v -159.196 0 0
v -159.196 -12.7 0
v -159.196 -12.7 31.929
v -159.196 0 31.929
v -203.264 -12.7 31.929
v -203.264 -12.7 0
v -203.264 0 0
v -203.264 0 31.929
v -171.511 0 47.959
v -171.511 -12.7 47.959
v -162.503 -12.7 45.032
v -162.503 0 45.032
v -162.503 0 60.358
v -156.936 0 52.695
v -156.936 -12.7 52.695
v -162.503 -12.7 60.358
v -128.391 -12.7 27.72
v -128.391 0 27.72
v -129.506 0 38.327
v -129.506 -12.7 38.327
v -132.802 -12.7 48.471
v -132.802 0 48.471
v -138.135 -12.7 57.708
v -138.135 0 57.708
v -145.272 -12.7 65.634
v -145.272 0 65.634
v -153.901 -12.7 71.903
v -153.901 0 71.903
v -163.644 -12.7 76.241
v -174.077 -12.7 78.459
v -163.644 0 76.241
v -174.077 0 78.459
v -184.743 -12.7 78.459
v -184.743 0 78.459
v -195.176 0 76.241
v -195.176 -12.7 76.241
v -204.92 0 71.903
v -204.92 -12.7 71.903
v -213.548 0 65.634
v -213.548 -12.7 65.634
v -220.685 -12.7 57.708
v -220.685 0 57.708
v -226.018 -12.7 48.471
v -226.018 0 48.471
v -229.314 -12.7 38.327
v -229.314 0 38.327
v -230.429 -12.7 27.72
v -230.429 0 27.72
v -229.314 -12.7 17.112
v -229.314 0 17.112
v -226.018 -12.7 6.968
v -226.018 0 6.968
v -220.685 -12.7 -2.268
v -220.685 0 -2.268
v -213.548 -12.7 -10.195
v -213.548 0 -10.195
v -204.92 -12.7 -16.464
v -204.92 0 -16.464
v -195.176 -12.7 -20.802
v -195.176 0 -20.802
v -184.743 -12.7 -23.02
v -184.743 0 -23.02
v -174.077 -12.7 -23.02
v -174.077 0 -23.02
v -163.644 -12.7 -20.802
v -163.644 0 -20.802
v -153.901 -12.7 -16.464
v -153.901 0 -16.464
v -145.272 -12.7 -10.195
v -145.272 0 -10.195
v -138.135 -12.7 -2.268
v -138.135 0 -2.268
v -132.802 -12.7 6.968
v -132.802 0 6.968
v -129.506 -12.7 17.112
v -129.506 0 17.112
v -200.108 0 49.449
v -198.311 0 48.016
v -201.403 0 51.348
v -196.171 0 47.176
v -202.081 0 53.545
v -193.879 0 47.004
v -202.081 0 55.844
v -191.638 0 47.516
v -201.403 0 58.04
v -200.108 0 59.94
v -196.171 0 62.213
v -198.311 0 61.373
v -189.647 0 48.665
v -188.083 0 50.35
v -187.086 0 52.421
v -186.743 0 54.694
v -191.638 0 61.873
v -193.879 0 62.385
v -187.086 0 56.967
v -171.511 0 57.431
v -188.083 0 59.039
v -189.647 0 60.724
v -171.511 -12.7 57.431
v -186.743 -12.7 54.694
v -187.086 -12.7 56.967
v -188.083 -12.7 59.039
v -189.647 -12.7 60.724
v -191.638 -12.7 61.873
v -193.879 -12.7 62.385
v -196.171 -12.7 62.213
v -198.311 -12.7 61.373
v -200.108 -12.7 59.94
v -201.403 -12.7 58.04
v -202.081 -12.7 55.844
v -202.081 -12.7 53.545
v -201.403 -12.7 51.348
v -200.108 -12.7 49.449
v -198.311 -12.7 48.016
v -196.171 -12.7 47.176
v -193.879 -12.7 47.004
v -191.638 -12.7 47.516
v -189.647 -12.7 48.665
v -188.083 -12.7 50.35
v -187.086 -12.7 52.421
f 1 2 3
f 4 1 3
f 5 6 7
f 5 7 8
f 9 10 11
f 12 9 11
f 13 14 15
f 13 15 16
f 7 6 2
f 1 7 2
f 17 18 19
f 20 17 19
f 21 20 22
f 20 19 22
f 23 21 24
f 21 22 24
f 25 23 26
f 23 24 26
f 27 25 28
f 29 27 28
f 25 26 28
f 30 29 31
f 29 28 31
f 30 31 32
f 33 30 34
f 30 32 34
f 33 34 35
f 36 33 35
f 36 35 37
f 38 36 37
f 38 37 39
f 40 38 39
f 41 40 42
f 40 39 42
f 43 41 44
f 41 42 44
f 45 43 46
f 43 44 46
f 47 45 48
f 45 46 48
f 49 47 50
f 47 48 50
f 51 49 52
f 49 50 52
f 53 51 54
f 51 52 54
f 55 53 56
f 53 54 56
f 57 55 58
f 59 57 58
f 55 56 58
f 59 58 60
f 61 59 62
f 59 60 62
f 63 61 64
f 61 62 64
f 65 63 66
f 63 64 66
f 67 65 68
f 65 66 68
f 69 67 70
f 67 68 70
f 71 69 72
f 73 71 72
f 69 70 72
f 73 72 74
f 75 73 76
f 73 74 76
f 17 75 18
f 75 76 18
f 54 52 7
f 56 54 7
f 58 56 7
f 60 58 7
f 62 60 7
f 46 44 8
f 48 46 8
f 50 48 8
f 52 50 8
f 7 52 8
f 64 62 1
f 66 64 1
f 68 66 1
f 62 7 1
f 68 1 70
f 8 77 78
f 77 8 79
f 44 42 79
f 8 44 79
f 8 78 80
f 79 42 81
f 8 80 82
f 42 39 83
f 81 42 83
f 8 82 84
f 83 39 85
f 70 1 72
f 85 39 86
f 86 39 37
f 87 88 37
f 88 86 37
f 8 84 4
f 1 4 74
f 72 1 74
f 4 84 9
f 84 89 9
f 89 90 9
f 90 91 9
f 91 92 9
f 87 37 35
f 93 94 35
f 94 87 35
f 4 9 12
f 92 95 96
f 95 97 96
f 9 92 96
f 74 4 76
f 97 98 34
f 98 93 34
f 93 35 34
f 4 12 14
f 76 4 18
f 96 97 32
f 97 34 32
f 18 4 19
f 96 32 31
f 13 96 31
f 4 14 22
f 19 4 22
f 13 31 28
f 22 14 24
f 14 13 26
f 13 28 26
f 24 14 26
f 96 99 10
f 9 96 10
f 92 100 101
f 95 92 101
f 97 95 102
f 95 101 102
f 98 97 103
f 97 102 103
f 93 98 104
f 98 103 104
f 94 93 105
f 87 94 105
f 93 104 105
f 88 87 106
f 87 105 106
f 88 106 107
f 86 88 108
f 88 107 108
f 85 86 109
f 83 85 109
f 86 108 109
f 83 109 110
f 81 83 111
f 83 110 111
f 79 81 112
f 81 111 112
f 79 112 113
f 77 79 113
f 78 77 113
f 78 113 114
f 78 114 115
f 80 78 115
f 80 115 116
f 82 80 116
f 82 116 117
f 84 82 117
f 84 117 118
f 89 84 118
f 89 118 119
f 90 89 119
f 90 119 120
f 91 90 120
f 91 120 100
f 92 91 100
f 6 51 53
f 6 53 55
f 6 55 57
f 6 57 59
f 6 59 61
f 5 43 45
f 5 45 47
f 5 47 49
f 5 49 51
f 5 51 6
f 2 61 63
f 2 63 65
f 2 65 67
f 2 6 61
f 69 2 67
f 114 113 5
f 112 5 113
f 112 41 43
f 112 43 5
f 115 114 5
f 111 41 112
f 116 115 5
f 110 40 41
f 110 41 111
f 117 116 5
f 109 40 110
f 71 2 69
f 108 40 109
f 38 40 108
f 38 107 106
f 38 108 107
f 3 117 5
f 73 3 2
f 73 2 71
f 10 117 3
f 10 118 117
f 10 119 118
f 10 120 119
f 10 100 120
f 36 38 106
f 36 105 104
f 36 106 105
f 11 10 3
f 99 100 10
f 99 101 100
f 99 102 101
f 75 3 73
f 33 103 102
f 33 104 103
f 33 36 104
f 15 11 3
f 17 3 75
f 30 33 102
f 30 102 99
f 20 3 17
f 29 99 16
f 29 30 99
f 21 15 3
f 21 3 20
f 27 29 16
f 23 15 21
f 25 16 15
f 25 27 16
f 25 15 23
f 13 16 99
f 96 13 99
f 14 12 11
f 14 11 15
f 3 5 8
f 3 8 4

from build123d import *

# Parameters (mm, degrees)
F0_R     = 51.018803
F1_DEPTH = 12.7
F2_W     = 44.067815
F2_H     = 31.929322
F3_DEPTH = 25.4
F5_DEPTH = 25.4
F6_R     = 7.711808
F7_DEPTH = 25.4


with BuildPart() as f1:
    # F0 (on Front) → F1 (new body)
    with BuildSketch(Plane.XZ):
        with Locations((-179.4101, 27.719645)):
            Circle(F0_R)
    extrude(amount=F1_DEPTH)

    # F2 (on face) → F3 (cut)
    with BuildSketch(Plane.XZ.offset(12.7)):
        with Locations((-181.2303, 15.964661)):
            Rectangle(F2_W, F2_H)
    extrude(amount=-F3_DEPTH, mode=Mode.SUBTRACT)

    # F4 (on face) → F5 (cut)
    with BuildSketch(Plane.XZ.offset(12.7)):
        Polygon((-171.511427, 57.43108), (-171.511427, 47.959364), (-162.50329, 45.032443), (-156.935955, 52.695222), (-162.50329, 60.358001), align=None)
    extrude(amount=-F5_DEPTH, mode=Mode.SUBTRACT)

    # F6 (on face) → F7 (cut)
    with BuildSketch(Plane.XZ.offset(12.7)):
        with Locations((-194.455087, 54.694314)):
            Circle(F6_R)
    extrude(amount=-F7_DEPTH, mode=Mode.SUBTRACT)


solid = f1.part
